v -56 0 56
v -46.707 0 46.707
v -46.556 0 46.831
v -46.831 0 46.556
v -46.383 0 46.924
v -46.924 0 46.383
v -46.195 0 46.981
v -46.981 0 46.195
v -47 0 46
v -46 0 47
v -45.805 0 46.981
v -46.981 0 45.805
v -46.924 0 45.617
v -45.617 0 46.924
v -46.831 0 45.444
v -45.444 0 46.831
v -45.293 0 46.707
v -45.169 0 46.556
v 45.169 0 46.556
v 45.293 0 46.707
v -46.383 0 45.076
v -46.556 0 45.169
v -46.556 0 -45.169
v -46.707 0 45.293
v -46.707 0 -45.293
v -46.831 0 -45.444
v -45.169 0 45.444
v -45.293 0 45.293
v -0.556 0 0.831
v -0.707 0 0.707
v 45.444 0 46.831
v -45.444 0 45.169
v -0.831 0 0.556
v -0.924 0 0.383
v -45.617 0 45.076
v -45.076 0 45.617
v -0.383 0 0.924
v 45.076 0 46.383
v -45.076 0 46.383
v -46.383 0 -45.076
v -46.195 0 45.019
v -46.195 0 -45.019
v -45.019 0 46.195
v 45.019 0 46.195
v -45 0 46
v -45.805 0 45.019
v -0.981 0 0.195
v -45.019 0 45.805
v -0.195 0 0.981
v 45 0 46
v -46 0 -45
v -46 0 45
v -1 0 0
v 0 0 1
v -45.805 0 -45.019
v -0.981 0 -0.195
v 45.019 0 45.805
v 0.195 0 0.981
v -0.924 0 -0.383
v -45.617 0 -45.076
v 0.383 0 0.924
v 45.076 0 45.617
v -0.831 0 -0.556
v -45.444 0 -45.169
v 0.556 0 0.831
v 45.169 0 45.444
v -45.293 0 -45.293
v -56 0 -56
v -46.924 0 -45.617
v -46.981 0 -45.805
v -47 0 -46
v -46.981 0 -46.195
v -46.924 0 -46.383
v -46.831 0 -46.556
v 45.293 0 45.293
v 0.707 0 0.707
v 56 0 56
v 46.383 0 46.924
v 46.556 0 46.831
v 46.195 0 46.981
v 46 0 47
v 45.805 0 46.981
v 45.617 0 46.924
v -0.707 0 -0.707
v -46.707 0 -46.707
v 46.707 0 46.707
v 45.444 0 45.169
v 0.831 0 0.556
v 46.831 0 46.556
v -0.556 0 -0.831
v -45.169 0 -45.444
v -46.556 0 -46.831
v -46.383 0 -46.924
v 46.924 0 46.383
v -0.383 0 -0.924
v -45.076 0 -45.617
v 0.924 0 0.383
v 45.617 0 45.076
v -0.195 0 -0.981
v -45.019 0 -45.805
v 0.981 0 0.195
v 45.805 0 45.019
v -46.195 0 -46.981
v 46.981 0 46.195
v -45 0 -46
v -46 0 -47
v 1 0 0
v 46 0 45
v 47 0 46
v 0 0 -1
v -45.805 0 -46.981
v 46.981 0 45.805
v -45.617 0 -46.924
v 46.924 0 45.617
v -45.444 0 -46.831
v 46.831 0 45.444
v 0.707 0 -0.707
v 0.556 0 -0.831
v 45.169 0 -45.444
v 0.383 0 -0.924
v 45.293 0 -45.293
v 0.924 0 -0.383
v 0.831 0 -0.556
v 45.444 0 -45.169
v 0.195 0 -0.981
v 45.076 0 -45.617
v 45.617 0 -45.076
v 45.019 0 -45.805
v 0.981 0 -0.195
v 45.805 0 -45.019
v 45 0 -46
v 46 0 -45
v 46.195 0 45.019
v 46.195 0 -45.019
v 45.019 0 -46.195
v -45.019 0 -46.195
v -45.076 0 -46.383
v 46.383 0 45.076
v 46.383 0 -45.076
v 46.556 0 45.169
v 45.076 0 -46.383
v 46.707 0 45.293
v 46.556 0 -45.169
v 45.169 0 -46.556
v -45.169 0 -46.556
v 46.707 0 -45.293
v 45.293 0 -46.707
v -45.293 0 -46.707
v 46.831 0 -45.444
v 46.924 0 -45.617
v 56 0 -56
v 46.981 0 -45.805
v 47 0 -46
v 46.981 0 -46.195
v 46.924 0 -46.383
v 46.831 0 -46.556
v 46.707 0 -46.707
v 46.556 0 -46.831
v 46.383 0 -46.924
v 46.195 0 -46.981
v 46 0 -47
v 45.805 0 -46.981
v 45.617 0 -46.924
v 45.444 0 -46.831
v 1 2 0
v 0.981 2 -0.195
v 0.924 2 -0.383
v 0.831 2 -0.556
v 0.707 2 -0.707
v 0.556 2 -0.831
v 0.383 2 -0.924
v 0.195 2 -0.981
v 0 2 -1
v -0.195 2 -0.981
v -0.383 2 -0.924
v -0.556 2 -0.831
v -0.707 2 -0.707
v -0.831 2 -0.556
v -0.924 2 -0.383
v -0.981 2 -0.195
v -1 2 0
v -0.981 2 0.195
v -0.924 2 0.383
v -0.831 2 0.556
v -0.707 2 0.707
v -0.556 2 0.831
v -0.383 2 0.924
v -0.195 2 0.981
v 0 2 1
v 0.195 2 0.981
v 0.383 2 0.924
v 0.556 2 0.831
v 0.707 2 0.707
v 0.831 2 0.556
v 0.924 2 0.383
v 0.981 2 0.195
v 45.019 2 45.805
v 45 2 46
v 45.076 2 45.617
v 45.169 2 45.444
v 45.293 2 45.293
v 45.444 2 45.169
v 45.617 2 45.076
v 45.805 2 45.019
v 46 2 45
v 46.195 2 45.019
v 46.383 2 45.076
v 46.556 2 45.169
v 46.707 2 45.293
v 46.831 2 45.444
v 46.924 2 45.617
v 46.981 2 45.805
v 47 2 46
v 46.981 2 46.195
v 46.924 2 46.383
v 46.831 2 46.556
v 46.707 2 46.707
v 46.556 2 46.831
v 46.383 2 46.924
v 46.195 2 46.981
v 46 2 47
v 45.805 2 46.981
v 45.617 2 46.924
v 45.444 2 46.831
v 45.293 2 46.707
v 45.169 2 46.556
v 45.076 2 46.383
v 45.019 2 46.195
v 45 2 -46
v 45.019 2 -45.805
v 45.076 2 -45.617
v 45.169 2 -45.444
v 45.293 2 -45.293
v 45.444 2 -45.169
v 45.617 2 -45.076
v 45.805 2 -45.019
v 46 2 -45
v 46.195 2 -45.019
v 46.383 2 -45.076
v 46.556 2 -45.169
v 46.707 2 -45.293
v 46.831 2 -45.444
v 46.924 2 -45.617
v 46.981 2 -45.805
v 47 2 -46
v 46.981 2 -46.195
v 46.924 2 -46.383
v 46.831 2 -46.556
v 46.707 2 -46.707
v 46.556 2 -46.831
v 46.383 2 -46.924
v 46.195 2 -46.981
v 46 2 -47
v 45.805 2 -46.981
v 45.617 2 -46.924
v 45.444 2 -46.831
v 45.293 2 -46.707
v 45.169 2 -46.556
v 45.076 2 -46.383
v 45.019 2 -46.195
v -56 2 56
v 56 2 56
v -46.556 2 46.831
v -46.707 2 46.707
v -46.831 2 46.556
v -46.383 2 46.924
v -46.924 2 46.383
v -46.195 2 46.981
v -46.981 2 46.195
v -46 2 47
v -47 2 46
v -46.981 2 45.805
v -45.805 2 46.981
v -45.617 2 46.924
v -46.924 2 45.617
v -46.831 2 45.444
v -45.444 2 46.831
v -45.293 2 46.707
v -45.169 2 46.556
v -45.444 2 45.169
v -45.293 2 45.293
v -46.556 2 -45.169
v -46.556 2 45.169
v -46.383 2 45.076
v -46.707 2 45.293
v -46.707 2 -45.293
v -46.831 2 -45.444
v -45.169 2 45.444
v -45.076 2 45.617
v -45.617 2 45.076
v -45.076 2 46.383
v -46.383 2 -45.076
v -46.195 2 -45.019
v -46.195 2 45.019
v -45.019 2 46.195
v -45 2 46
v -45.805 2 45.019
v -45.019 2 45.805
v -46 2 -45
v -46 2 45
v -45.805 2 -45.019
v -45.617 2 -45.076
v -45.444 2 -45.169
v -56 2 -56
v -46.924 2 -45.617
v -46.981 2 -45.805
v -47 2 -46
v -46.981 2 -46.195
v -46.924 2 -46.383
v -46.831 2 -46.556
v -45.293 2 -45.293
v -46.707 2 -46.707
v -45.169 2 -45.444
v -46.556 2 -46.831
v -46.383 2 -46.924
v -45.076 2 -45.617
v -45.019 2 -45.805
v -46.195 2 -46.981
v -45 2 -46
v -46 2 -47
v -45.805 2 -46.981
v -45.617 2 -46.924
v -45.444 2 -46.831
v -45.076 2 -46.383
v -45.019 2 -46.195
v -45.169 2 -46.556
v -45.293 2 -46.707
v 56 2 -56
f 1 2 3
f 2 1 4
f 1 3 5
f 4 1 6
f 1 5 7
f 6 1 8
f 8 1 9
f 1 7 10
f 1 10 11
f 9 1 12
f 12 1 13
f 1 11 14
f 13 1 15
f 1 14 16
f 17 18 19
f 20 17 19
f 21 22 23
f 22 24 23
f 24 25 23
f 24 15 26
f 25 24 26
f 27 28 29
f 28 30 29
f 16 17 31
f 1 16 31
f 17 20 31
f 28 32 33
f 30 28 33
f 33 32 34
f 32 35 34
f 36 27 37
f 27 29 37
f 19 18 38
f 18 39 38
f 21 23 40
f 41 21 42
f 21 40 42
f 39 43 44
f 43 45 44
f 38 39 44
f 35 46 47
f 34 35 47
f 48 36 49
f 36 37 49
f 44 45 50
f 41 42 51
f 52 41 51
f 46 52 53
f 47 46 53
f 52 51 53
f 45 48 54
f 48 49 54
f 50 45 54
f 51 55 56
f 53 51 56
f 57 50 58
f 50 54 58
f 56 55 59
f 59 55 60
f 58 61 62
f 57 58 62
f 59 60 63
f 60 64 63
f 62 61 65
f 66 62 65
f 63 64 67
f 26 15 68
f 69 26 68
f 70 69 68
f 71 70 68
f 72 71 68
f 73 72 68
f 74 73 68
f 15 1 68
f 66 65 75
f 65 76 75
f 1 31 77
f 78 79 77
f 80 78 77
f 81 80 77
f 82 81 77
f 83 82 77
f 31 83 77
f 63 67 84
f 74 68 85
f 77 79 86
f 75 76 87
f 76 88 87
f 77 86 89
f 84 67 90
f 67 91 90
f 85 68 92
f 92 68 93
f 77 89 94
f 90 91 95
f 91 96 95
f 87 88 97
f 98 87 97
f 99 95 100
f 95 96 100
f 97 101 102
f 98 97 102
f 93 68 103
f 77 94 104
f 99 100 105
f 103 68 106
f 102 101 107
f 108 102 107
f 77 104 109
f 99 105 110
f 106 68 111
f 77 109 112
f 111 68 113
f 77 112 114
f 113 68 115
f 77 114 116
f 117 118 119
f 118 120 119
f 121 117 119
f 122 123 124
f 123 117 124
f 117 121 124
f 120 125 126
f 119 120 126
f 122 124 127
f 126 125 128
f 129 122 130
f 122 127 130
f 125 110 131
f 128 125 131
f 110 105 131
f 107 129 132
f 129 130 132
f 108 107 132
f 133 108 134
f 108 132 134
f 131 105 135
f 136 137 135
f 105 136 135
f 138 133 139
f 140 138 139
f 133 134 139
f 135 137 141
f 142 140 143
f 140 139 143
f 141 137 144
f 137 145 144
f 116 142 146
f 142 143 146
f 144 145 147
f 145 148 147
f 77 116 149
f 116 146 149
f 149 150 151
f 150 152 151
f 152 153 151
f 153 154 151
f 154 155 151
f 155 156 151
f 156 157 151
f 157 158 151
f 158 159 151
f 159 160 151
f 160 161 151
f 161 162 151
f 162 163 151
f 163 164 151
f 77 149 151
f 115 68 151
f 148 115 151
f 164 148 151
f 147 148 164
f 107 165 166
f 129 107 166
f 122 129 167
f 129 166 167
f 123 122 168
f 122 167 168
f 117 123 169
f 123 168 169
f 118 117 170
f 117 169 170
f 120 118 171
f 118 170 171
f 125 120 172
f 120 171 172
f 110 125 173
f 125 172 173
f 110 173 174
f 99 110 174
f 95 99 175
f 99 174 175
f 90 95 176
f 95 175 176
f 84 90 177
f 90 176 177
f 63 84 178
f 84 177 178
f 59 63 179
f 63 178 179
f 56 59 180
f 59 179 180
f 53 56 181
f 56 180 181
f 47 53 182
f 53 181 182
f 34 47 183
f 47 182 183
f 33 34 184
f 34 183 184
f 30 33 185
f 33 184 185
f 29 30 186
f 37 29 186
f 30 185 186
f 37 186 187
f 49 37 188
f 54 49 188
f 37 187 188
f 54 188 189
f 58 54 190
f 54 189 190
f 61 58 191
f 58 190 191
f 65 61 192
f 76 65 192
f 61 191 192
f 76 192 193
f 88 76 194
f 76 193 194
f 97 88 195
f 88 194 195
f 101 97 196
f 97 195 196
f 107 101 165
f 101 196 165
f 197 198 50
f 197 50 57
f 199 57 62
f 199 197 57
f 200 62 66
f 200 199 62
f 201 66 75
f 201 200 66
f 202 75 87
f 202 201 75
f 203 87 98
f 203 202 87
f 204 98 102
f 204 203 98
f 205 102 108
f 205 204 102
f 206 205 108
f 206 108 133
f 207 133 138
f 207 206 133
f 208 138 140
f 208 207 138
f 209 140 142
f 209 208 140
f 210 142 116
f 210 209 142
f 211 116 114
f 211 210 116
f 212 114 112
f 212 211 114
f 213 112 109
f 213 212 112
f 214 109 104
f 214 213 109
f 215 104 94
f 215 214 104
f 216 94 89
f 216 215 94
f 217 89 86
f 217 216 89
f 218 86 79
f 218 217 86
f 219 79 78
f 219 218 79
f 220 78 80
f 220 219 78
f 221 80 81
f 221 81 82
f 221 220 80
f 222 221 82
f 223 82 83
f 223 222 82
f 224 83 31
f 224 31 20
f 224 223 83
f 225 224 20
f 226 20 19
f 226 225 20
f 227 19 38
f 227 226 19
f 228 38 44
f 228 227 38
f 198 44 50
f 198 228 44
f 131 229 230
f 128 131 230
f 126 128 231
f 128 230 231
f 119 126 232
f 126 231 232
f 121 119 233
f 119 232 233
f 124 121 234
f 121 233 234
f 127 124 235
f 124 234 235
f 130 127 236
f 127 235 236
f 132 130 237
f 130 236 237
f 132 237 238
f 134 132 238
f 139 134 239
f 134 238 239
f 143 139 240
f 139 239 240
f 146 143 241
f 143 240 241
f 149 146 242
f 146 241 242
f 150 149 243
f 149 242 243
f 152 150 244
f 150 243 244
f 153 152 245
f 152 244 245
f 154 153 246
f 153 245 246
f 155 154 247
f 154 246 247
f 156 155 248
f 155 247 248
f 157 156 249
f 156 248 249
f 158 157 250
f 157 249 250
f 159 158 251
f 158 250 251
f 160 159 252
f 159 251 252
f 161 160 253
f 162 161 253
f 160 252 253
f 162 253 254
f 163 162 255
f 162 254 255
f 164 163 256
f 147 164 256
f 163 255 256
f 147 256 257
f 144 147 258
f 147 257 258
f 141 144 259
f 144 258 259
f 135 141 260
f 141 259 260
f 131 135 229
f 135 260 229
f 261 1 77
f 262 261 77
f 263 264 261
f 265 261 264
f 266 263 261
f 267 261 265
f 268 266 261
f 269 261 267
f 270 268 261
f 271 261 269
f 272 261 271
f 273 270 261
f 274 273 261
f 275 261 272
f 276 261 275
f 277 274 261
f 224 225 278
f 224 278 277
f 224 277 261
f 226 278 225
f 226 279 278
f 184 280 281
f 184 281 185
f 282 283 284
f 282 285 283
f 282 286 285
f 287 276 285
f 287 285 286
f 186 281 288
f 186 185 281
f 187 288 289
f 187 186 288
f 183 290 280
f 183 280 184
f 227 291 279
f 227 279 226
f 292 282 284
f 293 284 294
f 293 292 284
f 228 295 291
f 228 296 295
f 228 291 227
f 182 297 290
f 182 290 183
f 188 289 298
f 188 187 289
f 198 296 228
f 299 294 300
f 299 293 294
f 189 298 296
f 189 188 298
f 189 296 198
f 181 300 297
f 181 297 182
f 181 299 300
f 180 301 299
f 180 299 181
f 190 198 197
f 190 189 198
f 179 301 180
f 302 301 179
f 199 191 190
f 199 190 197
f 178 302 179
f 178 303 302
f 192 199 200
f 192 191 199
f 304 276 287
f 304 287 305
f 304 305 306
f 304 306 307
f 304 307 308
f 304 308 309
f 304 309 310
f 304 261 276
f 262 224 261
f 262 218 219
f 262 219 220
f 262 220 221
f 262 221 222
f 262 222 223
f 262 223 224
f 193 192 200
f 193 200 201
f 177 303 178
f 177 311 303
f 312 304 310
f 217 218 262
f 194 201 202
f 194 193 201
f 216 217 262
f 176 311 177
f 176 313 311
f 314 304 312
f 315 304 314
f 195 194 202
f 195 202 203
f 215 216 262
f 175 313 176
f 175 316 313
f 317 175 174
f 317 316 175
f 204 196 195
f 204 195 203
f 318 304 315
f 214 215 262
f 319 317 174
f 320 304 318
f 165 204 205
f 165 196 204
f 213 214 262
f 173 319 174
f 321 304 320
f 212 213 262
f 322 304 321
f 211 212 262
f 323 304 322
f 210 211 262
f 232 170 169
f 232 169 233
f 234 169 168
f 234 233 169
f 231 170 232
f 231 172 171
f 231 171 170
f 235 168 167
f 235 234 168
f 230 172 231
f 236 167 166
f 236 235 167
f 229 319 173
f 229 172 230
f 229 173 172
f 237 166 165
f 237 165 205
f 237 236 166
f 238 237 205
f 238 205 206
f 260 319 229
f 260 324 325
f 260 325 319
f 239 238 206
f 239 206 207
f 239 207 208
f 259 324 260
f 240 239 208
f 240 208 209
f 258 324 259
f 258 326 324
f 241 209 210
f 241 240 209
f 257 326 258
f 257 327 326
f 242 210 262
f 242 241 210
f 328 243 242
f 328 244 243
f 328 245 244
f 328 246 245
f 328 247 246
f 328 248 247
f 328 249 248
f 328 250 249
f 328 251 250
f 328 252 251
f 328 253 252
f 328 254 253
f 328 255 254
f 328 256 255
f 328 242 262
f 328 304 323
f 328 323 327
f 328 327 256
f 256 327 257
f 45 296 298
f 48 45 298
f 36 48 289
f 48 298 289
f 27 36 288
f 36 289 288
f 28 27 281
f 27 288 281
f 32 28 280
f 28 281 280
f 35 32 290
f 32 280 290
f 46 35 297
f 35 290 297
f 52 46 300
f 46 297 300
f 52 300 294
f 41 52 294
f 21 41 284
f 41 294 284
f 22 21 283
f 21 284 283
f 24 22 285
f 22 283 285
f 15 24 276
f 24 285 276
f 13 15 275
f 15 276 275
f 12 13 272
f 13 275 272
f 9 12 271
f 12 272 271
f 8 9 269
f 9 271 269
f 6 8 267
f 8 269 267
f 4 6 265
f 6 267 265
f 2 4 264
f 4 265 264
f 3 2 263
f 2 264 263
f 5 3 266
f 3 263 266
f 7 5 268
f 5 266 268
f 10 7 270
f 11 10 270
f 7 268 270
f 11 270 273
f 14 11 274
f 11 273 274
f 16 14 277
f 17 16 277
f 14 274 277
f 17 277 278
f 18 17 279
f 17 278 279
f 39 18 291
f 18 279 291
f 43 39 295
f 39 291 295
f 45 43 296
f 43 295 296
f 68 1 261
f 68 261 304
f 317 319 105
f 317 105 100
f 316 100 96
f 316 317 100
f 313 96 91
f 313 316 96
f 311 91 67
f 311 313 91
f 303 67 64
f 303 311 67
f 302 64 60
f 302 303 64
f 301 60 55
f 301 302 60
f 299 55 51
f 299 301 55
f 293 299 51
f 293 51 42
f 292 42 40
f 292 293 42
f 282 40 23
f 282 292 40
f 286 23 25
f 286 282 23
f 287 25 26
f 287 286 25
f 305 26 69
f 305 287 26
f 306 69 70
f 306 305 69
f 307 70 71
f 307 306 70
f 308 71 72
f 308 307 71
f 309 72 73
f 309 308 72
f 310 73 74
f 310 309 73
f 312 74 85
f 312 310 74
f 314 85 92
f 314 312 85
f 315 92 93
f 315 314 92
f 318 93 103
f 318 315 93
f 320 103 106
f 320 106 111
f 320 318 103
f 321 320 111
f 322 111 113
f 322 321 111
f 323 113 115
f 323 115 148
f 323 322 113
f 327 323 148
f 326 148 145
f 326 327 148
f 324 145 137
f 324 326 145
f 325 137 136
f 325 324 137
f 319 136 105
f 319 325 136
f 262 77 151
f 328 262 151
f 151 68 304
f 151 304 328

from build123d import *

# Parameters (mm, degrees)
SKETCH1_W                                  = 112
SKETCH1_H                                  = 112
BOSS_EXTRUDE1_DEPTH                        = 2
SKETCH2_R                                  = 1
CUT_EXTRUDE1_DEPTH                         = 2
MIRROR1_AT_THE_SECOND_PLANE_COPY_1_SKETC_R = 1
MIRROR1_AT_THE_SECOND_PLANE_COPY_1_DEPTH   = 2


with BuildPart() as part:
    # Sketch1 → Boss-Extrude1 (new body)
    with BuildSketch(Plane(origin=(0, 0, 0), x_dir=(1, 0, 0), z_dir=(0, 1, 0))):
        Rectangle(SKETCH1_W, SKETCH1_H)
    extrude(amount=BOSS_EXTRUDE1_DEPTH)

    # Sketch2 → Cut-Extrude1 (cut)
    with BuildSketch(Plane(origin=(0, 2, 0), x_dir=(1, 0, 0), z_dir=(0, 1, 0))):
        with Locations((-46, -46)):
            Circle(SKETCH2_R)
        Circle(SKETCH2_R)
    cut_extrude1 = extrude(amount=-CUT_EXTRUDE1_DEPTH, mode=Mode.SUBTRACT)

    # Mirror1: Cut-Extrude1 across plane
    add(cut_extrude1.mirror(Plane(origin=(0, 0, 0), x_dir=(0, 0, 1), z_dir=(1, 0, 0))), mode=Mode.SUBTRACT)

    # Mirror1 at the second plane: Cut-Extrude1 across plane
    add(cut_extrude1.mirror(Plane.XY), mode=Mode.SUBTRACT)

    # Mirror1 at the second plane copy 1 sketc → Mirror1 at the second plane copy 1 (cut)
    with BuildSketch(Plane(origin=(0, 2, 0), x_dir=(-1, 0, 0), z_dir=(0, 1, 0))):
        with Locations((-46, -46)):
            Circle(MIRROR1_AT_THE_SECOND_PLANE_COPY_1_SKETC_R)
        Circle(MIRROR1_AT_THE_SECOND_PLANE_COPY_1_SKETC_R)
    extrude(amount=-MIRROR1_AT_THE_SECOND_PLANE_COPY_1_DEPTH, mode=Mode.SUBTRACT)


solid = part.part
